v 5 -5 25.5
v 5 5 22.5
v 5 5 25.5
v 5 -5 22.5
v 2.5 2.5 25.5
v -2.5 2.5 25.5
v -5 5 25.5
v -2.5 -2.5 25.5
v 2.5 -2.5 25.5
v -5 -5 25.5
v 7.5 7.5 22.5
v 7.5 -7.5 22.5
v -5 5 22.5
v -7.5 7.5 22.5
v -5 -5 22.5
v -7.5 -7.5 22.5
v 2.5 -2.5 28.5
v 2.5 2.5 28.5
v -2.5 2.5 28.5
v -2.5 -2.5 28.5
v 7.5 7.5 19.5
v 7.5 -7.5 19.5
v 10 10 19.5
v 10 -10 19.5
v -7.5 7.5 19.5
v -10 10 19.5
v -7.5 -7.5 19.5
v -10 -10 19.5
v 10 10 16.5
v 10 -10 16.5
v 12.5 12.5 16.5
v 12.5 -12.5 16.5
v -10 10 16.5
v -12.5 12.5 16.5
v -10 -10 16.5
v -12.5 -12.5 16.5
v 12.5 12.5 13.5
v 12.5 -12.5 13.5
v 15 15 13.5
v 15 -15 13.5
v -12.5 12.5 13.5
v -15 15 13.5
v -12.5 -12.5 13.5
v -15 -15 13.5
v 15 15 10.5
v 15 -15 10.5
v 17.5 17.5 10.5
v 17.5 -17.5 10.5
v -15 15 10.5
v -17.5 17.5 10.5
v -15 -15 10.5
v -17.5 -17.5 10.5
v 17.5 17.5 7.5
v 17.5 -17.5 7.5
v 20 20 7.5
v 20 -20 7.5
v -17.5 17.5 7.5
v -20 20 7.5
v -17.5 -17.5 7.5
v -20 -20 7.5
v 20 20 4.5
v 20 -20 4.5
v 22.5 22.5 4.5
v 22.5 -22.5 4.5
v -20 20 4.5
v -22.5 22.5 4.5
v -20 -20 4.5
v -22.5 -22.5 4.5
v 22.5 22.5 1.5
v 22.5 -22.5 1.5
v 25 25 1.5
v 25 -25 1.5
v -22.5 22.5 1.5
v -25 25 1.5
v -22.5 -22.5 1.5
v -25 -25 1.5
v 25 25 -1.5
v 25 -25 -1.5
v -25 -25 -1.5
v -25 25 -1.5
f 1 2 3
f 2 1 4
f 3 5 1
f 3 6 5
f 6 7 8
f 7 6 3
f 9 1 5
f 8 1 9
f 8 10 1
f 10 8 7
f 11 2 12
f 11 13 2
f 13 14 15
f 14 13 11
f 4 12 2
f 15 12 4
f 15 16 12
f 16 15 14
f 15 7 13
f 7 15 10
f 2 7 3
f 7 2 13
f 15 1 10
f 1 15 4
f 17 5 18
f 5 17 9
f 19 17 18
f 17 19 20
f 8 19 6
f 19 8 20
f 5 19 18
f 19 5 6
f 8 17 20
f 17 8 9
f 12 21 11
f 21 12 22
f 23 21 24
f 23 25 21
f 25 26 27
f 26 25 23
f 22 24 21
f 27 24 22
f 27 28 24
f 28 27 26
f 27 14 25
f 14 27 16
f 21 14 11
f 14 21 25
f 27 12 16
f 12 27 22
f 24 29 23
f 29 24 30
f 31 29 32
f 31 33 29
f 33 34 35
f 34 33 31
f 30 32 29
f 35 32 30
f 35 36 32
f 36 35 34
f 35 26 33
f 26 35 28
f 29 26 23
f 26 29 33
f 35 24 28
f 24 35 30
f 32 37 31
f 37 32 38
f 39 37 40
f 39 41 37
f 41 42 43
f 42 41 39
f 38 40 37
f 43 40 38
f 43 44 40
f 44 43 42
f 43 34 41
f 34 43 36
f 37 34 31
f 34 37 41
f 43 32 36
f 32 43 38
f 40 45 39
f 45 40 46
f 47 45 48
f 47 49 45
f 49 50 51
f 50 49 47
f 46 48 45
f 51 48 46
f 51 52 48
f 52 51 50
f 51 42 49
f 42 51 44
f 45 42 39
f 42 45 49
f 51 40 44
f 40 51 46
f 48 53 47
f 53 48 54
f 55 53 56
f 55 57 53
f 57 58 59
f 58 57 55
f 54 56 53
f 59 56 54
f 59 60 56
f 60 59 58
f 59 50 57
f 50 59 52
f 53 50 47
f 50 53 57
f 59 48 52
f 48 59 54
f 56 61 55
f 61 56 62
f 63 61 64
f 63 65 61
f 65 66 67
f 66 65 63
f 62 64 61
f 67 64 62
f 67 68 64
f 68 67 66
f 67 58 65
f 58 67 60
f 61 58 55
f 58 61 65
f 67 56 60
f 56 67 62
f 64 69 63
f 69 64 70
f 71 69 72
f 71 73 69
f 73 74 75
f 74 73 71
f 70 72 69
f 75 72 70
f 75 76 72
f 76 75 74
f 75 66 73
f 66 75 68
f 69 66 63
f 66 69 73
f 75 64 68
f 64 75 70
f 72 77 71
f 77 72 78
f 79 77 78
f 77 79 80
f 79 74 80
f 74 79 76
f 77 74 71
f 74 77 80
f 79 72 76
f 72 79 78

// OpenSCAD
//-- Ejemplo de figura recursiva
//-- Piramide escalonada
//-- Utilizar Openscad 2014.03 o superior

//-- Parametros
step = 3; //-- Altura de cada nivel
min = 5;  //-- Dimensiones de la parte superior (ultimo nivel)

//-- Modulo recursivo
//-- n: Numero de niveles de la piramide
module zigurat(n)
{

  //-- Terminacion: en el nivel uno se situa el cubo superior (pequeño)
  if (n <= 1) {
	cube([min, min, step], center = true);
  }
  else {
    //-- Dibujar el cubo del nivel n
    cube([n * min, n * min, step], center = true);

    //-- Colocar encima una piramide de n-1 niveles (recursion)
	translate([0, 0, step])
	  zigurat(n - 1);
  }
}	

//-- Piramide de 10 niveles
zigurat(10);
